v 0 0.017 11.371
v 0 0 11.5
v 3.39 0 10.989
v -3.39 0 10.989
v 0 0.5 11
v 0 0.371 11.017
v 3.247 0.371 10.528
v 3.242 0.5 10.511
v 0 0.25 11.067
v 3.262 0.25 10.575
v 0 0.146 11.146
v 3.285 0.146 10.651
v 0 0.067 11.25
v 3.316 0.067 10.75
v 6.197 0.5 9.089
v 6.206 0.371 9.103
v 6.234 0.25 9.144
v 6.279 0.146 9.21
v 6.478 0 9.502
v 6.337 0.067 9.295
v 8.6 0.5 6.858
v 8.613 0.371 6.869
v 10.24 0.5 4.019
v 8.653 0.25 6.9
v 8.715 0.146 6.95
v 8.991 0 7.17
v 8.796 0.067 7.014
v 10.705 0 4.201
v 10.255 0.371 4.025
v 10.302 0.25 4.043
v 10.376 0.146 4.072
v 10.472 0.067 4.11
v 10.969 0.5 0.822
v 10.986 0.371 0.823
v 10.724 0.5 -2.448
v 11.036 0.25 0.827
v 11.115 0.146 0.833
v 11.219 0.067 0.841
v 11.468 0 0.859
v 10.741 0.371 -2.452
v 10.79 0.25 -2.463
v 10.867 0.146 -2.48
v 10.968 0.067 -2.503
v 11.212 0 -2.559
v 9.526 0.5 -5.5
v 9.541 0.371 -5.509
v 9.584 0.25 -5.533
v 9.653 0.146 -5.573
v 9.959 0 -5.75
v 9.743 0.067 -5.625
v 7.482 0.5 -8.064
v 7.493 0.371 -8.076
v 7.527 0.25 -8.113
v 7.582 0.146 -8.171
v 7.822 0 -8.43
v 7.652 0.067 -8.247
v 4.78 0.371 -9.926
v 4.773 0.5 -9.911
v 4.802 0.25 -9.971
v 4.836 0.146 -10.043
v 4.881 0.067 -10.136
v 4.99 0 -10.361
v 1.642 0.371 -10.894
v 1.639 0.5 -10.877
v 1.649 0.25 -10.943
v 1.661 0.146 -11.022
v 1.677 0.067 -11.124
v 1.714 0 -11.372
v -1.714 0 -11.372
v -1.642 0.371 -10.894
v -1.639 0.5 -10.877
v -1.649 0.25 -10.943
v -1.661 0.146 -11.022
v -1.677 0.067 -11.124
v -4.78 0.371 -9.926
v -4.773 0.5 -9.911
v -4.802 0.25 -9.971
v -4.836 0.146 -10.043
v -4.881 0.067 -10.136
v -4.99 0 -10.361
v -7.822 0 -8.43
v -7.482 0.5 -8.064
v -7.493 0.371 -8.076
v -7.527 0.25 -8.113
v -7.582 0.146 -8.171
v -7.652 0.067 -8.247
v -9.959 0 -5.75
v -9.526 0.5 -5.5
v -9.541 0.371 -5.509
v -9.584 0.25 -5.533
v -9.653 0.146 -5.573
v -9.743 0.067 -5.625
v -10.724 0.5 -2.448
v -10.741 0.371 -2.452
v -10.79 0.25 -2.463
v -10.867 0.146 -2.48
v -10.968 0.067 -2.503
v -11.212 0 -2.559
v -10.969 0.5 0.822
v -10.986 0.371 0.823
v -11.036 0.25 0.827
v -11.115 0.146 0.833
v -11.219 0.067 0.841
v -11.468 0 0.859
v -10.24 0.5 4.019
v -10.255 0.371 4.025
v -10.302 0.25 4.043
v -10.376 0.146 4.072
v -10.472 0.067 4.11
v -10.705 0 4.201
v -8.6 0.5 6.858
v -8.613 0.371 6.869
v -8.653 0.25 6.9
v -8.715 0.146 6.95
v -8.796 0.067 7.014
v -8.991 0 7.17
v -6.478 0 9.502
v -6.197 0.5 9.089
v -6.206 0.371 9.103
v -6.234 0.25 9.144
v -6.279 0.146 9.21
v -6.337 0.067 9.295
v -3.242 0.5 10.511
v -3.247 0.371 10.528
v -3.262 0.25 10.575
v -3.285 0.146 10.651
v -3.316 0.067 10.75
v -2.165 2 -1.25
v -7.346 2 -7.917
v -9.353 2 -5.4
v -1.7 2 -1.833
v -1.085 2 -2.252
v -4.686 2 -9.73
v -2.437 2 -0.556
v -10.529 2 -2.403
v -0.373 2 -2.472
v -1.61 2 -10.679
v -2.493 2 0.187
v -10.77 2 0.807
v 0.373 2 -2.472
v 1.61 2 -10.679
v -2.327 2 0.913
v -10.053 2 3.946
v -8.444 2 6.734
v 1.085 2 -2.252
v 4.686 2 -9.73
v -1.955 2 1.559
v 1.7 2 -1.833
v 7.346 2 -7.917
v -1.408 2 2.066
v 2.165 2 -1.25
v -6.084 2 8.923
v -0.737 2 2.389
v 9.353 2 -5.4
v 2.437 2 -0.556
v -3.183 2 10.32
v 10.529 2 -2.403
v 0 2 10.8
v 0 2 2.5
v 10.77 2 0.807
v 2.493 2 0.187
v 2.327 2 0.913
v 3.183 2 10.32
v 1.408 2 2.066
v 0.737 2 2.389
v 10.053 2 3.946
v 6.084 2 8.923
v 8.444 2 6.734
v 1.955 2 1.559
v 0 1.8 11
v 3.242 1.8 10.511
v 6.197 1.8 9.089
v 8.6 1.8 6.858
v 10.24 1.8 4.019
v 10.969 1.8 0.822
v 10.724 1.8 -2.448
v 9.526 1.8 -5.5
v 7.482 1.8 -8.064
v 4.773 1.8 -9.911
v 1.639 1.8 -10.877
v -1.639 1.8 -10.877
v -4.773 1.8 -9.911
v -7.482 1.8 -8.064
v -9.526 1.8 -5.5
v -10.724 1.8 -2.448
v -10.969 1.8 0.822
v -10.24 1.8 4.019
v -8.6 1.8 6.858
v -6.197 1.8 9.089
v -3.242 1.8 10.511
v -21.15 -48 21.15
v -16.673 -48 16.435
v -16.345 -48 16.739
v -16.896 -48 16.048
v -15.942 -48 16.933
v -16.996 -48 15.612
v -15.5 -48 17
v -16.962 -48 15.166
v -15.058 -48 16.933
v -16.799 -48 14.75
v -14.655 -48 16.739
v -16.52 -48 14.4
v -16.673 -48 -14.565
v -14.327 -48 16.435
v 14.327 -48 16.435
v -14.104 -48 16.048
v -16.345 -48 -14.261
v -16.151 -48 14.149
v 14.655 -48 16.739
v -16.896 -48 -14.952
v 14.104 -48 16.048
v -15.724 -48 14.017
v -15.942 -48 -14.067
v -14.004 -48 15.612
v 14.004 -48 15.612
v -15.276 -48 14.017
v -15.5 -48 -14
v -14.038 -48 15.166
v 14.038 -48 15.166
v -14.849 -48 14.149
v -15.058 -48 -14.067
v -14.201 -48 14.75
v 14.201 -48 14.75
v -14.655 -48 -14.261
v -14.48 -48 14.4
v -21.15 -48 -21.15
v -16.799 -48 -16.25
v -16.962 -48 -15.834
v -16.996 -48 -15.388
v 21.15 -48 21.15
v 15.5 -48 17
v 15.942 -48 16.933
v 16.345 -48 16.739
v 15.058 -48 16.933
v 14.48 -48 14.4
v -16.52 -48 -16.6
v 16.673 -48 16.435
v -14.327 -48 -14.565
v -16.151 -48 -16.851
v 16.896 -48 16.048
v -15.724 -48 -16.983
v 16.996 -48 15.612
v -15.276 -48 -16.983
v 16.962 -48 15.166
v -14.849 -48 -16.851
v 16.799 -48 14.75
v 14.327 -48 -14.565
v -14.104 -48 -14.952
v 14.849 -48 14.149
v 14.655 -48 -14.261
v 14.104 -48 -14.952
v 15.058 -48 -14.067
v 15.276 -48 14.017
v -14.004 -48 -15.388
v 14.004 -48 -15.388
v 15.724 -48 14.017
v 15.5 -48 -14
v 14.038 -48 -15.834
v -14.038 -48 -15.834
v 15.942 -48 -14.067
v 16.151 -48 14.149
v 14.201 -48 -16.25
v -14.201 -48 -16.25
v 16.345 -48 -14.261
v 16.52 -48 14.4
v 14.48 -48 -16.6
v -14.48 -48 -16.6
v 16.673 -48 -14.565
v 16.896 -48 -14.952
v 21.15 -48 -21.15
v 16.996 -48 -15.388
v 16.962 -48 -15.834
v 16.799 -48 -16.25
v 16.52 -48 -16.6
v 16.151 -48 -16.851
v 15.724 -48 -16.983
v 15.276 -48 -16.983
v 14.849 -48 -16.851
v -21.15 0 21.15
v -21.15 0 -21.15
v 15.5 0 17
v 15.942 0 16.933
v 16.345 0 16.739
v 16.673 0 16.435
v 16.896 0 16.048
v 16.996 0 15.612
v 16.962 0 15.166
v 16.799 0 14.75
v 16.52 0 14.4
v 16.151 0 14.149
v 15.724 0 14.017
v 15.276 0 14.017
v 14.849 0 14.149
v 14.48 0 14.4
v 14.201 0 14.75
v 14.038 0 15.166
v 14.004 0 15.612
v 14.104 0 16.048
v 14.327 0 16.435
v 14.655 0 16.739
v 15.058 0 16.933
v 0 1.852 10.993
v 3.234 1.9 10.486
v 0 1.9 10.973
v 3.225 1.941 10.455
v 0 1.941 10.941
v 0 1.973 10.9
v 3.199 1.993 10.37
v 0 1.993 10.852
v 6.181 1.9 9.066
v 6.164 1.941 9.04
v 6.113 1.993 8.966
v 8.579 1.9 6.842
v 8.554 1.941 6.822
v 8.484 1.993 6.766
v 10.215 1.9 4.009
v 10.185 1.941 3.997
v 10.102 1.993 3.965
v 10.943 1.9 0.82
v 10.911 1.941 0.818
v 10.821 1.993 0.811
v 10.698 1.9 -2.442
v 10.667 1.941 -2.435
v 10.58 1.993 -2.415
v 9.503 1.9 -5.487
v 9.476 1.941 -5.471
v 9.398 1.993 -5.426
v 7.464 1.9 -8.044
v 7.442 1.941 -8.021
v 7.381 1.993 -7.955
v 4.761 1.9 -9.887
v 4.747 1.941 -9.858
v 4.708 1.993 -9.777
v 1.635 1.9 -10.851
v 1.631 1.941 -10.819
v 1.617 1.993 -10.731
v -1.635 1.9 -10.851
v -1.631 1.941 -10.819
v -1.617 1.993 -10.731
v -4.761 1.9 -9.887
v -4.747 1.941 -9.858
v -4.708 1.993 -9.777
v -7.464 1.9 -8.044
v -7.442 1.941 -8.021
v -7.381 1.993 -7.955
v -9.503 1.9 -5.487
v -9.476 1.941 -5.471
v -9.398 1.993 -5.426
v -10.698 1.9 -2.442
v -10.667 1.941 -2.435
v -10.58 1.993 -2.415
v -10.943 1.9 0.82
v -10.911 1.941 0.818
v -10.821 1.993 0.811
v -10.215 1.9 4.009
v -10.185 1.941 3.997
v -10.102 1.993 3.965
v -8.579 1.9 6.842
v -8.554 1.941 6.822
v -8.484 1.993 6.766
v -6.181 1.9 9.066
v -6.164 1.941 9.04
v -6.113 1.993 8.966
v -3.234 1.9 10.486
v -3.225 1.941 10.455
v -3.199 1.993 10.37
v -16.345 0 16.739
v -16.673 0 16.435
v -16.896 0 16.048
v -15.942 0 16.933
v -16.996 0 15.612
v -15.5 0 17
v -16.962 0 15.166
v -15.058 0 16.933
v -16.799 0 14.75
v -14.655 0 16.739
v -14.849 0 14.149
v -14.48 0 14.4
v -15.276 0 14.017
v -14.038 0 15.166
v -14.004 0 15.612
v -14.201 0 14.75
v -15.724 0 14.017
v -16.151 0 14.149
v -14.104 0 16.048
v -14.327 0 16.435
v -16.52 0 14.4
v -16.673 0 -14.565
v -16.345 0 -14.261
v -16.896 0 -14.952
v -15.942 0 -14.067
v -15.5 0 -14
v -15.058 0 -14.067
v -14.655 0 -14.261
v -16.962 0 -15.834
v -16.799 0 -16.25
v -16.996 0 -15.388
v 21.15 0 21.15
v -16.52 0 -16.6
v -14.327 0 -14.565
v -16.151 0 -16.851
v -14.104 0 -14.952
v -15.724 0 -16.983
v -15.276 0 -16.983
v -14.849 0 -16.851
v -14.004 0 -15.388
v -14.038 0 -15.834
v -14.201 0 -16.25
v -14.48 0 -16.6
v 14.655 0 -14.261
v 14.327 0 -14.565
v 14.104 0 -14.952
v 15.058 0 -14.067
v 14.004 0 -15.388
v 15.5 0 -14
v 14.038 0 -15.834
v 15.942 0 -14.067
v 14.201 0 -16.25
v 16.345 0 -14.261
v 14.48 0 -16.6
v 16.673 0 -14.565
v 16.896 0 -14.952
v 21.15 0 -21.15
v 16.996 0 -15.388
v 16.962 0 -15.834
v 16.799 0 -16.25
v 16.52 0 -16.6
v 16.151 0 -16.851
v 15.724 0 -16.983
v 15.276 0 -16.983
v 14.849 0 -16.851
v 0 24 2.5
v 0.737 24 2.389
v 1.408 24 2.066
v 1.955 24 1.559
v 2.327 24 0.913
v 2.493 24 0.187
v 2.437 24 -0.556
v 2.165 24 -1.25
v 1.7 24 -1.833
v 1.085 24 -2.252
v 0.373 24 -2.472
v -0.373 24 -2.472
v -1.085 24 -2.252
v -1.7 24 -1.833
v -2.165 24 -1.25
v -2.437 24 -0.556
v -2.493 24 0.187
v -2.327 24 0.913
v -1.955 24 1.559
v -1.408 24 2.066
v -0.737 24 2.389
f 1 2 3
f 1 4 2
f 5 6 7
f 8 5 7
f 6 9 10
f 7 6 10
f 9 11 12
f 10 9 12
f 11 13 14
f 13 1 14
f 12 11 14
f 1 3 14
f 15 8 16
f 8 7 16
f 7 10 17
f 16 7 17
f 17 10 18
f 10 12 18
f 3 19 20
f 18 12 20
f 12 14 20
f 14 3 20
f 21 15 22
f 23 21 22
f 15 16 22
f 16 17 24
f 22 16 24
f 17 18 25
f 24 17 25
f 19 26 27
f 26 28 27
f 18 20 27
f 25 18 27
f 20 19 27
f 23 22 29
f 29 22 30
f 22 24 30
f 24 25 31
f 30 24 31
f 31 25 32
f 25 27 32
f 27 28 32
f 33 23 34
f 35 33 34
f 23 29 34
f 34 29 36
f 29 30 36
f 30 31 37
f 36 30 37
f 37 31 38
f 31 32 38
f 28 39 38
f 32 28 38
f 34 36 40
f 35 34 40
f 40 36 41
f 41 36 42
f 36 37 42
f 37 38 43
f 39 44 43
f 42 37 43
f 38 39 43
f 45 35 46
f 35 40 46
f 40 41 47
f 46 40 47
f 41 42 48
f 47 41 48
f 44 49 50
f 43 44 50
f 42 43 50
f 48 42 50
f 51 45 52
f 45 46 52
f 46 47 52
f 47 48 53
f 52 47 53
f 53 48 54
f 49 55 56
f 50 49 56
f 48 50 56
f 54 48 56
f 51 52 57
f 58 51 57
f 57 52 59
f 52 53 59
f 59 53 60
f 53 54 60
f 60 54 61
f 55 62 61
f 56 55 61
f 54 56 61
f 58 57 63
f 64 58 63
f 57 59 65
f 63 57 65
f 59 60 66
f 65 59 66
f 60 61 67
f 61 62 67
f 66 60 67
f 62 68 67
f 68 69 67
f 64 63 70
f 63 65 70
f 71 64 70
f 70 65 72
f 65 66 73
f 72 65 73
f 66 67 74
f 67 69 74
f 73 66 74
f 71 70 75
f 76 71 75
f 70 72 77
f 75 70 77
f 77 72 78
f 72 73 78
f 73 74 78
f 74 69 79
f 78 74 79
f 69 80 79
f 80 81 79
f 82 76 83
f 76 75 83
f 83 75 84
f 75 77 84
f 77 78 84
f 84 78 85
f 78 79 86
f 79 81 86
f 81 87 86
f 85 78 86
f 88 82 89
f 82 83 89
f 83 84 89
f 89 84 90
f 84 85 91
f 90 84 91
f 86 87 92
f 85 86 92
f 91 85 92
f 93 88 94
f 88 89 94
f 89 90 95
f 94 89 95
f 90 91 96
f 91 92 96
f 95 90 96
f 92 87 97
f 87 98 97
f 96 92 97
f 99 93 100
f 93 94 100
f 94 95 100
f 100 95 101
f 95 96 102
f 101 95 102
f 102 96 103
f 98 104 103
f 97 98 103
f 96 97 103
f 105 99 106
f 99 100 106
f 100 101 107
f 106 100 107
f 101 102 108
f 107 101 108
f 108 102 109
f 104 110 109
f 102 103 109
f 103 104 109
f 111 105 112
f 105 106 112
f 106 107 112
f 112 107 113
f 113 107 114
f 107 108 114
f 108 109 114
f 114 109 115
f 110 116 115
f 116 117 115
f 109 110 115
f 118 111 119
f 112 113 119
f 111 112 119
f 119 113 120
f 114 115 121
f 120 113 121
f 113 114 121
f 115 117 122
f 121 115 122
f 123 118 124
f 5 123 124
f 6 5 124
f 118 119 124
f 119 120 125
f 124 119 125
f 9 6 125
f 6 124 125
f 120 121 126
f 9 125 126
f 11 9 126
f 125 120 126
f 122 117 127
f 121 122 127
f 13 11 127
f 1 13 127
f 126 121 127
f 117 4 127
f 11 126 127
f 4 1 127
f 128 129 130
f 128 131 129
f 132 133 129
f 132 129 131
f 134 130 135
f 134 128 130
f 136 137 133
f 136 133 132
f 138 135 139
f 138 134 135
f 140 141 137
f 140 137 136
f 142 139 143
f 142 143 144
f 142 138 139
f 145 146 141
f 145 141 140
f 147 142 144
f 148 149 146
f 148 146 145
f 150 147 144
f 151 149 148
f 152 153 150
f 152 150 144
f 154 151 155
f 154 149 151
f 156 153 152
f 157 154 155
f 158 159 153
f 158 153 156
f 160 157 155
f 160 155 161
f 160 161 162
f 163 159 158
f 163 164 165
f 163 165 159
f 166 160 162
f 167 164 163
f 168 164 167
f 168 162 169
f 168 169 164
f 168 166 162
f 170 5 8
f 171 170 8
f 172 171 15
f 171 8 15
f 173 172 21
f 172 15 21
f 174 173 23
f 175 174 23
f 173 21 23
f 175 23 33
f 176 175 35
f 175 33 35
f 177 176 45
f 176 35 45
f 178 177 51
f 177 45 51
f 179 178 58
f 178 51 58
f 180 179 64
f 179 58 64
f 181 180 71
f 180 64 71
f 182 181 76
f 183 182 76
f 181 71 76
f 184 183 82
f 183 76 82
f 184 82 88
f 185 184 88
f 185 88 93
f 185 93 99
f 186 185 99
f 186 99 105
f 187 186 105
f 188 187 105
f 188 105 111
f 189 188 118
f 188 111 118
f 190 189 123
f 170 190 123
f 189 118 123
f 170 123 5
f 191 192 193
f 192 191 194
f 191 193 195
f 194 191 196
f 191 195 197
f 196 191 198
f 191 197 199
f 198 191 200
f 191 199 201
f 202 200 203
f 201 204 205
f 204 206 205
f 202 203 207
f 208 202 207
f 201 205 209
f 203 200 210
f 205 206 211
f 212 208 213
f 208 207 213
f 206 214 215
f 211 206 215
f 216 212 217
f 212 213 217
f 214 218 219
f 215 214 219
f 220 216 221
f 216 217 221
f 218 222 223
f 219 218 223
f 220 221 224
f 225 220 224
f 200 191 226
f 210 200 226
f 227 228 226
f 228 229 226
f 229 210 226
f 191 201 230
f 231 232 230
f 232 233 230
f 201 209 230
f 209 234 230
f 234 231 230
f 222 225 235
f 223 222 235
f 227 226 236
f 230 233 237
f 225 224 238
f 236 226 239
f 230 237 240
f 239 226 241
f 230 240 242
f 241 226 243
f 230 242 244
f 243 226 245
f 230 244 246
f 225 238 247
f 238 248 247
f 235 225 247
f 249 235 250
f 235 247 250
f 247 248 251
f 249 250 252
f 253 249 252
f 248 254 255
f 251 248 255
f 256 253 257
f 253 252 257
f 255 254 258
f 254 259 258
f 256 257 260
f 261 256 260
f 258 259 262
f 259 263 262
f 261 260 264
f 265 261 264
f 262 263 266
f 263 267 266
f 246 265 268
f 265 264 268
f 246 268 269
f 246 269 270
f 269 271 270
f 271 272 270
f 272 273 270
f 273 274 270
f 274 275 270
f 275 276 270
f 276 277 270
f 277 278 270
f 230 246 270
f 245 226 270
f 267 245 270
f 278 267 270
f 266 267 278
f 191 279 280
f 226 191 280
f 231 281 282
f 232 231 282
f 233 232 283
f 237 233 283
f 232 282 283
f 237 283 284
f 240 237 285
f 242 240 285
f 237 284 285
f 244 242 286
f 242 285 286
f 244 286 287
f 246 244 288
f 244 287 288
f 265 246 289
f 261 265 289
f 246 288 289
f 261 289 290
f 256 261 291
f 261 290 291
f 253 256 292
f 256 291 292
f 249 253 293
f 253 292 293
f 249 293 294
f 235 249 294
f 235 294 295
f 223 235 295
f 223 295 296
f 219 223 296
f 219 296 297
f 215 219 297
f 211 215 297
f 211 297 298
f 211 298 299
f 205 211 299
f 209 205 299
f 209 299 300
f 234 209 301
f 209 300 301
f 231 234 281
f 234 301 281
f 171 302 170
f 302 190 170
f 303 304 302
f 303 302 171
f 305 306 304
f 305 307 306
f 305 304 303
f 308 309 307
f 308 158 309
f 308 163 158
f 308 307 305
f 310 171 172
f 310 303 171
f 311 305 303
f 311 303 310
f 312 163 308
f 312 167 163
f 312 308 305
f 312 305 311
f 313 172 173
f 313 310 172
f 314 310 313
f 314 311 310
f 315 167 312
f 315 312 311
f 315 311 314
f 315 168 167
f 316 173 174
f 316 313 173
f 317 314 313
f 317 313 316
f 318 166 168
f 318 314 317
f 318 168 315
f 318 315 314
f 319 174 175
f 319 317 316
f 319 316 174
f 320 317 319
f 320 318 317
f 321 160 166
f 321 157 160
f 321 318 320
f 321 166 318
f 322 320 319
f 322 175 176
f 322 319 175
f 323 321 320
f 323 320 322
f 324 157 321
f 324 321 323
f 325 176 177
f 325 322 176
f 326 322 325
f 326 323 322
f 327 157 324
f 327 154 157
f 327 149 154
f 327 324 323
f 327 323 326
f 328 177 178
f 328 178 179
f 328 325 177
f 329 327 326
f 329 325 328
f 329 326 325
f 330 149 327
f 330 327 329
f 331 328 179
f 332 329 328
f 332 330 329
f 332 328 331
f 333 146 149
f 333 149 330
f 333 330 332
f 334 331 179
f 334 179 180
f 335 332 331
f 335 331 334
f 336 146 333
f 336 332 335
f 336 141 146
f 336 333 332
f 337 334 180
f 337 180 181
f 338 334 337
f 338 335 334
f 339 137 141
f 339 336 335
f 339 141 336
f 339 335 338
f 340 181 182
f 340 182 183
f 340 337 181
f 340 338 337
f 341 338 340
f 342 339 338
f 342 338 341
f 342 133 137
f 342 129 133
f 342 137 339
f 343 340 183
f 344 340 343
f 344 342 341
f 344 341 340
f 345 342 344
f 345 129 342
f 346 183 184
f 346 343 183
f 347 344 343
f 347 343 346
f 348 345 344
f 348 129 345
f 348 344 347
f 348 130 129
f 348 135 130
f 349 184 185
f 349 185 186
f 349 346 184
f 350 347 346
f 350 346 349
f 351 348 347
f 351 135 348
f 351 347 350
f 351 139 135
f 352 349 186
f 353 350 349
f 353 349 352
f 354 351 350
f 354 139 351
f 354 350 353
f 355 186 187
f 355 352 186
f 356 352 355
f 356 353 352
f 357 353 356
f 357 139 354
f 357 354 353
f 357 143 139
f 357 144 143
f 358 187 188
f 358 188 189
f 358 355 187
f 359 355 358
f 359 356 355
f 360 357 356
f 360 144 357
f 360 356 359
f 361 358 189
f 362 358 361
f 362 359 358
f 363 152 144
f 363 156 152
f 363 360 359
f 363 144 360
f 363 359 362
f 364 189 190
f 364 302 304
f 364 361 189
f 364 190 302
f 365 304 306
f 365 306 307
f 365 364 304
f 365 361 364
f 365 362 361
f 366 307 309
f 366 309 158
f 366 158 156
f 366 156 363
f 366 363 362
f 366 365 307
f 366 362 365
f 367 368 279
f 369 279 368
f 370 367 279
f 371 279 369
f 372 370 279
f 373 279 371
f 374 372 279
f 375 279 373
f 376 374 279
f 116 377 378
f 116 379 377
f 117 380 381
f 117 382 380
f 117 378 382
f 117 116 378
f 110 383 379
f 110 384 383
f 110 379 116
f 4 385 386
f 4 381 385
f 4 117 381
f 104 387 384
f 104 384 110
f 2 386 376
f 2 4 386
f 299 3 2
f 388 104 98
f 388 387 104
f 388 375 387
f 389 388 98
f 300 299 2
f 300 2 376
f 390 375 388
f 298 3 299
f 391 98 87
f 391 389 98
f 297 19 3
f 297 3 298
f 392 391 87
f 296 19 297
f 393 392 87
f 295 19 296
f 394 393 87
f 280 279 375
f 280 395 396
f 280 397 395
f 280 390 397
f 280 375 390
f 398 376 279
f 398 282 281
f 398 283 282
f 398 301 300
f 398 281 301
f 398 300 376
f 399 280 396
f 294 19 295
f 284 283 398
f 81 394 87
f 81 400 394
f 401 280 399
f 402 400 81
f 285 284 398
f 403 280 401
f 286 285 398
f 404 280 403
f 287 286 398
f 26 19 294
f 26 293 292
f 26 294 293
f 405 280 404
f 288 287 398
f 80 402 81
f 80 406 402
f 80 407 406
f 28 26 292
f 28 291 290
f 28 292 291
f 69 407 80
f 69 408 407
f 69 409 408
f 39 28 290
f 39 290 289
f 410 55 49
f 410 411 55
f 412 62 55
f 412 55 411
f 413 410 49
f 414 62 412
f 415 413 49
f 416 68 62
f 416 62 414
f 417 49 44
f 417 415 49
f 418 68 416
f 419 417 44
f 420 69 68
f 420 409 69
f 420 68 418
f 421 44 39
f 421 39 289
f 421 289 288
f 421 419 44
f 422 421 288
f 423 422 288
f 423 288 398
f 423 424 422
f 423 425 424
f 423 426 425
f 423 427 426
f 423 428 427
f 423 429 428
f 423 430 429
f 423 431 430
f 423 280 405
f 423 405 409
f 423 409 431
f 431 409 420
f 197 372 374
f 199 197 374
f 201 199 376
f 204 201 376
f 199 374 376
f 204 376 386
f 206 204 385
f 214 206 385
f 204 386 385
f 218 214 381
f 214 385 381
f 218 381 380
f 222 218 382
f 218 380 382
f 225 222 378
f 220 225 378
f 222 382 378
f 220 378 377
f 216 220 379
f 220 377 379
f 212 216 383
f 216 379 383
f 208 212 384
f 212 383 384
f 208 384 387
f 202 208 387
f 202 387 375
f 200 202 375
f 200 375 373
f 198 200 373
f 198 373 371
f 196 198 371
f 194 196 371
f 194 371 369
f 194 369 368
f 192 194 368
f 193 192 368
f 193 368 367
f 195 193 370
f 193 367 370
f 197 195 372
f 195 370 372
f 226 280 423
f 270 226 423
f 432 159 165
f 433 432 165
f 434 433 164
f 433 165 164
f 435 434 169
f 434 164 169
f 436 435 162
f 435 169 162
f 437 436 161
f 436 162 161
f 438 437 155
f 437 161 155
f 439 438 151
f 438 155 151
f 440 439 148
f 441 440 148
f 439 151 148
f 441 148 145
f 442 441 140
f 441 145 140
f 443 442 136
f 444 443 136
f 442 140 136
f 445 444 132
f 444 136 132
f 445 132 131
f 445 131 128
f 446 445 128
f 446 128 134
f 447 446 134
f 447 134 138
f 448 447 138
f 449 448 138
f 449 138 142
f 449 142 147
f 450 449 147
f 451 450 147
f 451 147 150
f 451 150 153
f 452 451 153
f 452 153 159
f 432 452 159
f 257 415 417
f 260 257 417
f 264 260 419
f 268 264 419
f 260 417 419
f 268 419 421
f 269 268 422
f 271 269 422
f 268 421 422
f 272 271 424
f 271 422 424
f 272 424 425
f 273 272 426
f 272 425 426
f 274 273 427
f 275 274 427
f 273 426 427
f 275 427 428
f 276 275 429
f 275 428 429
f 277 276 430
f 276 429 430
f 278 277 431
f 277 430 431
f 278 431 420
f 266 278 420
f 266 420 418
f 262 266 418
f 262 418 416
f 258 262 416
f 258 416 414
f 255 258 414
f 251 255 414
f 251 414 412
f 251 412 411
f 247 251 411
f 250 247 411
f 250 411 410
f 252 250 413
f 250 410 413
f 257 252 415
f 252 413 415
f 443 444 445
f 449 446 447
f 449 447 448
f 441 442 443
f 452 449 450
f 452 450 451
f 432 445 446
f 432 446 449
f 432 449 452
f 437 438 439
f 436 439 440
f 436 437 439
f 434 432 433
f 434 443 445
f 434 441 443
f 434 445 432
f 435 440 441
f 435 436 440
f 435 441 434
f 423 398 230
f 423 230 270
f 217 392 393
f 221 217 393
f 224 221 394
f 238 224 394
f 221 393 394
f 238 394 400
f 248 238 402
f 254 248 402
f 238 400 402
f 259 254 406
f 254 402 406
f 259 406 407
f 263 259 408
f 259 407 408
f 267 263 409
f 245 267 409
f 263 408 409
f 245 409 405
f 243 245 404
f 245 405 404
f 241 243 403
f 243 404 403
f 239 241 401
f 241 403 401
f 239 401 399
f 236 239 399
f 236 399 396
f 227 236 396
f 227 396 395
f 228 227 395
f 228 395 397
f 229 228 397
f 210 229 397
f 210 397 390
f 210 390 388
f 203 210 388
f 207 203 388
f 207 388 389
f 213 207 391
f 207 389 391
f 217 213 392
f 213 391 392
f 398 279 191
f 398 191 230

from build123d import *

# Parameters (mm, degrees)
SKETCH1_W           = 42.3
SKETCH1_H           = 42.3
SKETCH1_R           = 1.5
BOSS_EXTRUDE1_DEPTH = 48
SKETCH2_R           = 11
BOSS_EXTRUDE2_DEPTH = 2
SKETCH3_R           = 2.5
BOSS_EXTRUDE3_DEPTH = 24
FILLET1_R           = 0.5
FILLET2_R           = 0.2


with BuildPart() as part:
    # Sketch1 → Boss-Extrude1 (new body)
    with BuildSketch(Plane(origin=(0, 0, 0), x_dir=(1, 0, 0), z_dir=(0, 1, 0))):
        Rectangle(SKETCH1_W, SKETCH1_H)
        with Locations(Location((15.5, 15.5, 0), (0, 0, 270))):
            Circle(SKETCH1_R, mode=Mode.SUBTRACT)
        with Locations(Location((-15.5, 15.5, 0), (0, 0, 270))):
            Circle(SKETCH1_R, mode=Mode.SUBTRACT)
        with Locations(Location((-15.5, -15.5, 0), (0, 0, 270))):
            Circle(SKETCH1_R, mode=Mode.SUBTRACT)
        with Locations(Location((15.5, -15.5, 0), (0, 0, 270))):
            Circle(SKETCH1_R, mode=Mode.SUBTRACT)
    extrude(amount=-BOSS_EXTRUDE1_DEPTH)

    # Sketch2 → Boss-Extrude2 (add)
    with BuildSketch(Plane(origin=(0, 0, 0), x_dir=(1, 0, 0), z_dir=(0, 1, 0))):
        with Locations(Location((0, 0, 0), (0, 0, 270))):
            Circle(SKETCH2_R)
    extrude(amount=BOSS_EXTRUDE2_DEPTH)

    # Sketch3 → Boss-Extrude3 (add)
    with BuildSketch(Plane(origin=(0, 0, 0), x_dir=(1, 0, 0), z_dir=(0, 1, 0))):
        with Locations(Location((0, 0, 0), (0, 0, 270))):
            Circle(SKETCH3_R)
    extrude(amount=BOSS_EXTRUDE3_DEPTH)

    # Fillet1
    fillet1_edges = [part.edges().sort_by_distance(p)[0] for p in [
        (0, 0, -11),
    ]]
    fillet(fillet1_edges, radius=FILLET1_R)

    # Fillet2
    fillet2_edges = [part.edges().sort_by_distance(p)[0] for p in [
        (0, 2, -11),
    ]]
    fillet(fillet2_edges, radius=FILLET2_R)


solid = part.part
